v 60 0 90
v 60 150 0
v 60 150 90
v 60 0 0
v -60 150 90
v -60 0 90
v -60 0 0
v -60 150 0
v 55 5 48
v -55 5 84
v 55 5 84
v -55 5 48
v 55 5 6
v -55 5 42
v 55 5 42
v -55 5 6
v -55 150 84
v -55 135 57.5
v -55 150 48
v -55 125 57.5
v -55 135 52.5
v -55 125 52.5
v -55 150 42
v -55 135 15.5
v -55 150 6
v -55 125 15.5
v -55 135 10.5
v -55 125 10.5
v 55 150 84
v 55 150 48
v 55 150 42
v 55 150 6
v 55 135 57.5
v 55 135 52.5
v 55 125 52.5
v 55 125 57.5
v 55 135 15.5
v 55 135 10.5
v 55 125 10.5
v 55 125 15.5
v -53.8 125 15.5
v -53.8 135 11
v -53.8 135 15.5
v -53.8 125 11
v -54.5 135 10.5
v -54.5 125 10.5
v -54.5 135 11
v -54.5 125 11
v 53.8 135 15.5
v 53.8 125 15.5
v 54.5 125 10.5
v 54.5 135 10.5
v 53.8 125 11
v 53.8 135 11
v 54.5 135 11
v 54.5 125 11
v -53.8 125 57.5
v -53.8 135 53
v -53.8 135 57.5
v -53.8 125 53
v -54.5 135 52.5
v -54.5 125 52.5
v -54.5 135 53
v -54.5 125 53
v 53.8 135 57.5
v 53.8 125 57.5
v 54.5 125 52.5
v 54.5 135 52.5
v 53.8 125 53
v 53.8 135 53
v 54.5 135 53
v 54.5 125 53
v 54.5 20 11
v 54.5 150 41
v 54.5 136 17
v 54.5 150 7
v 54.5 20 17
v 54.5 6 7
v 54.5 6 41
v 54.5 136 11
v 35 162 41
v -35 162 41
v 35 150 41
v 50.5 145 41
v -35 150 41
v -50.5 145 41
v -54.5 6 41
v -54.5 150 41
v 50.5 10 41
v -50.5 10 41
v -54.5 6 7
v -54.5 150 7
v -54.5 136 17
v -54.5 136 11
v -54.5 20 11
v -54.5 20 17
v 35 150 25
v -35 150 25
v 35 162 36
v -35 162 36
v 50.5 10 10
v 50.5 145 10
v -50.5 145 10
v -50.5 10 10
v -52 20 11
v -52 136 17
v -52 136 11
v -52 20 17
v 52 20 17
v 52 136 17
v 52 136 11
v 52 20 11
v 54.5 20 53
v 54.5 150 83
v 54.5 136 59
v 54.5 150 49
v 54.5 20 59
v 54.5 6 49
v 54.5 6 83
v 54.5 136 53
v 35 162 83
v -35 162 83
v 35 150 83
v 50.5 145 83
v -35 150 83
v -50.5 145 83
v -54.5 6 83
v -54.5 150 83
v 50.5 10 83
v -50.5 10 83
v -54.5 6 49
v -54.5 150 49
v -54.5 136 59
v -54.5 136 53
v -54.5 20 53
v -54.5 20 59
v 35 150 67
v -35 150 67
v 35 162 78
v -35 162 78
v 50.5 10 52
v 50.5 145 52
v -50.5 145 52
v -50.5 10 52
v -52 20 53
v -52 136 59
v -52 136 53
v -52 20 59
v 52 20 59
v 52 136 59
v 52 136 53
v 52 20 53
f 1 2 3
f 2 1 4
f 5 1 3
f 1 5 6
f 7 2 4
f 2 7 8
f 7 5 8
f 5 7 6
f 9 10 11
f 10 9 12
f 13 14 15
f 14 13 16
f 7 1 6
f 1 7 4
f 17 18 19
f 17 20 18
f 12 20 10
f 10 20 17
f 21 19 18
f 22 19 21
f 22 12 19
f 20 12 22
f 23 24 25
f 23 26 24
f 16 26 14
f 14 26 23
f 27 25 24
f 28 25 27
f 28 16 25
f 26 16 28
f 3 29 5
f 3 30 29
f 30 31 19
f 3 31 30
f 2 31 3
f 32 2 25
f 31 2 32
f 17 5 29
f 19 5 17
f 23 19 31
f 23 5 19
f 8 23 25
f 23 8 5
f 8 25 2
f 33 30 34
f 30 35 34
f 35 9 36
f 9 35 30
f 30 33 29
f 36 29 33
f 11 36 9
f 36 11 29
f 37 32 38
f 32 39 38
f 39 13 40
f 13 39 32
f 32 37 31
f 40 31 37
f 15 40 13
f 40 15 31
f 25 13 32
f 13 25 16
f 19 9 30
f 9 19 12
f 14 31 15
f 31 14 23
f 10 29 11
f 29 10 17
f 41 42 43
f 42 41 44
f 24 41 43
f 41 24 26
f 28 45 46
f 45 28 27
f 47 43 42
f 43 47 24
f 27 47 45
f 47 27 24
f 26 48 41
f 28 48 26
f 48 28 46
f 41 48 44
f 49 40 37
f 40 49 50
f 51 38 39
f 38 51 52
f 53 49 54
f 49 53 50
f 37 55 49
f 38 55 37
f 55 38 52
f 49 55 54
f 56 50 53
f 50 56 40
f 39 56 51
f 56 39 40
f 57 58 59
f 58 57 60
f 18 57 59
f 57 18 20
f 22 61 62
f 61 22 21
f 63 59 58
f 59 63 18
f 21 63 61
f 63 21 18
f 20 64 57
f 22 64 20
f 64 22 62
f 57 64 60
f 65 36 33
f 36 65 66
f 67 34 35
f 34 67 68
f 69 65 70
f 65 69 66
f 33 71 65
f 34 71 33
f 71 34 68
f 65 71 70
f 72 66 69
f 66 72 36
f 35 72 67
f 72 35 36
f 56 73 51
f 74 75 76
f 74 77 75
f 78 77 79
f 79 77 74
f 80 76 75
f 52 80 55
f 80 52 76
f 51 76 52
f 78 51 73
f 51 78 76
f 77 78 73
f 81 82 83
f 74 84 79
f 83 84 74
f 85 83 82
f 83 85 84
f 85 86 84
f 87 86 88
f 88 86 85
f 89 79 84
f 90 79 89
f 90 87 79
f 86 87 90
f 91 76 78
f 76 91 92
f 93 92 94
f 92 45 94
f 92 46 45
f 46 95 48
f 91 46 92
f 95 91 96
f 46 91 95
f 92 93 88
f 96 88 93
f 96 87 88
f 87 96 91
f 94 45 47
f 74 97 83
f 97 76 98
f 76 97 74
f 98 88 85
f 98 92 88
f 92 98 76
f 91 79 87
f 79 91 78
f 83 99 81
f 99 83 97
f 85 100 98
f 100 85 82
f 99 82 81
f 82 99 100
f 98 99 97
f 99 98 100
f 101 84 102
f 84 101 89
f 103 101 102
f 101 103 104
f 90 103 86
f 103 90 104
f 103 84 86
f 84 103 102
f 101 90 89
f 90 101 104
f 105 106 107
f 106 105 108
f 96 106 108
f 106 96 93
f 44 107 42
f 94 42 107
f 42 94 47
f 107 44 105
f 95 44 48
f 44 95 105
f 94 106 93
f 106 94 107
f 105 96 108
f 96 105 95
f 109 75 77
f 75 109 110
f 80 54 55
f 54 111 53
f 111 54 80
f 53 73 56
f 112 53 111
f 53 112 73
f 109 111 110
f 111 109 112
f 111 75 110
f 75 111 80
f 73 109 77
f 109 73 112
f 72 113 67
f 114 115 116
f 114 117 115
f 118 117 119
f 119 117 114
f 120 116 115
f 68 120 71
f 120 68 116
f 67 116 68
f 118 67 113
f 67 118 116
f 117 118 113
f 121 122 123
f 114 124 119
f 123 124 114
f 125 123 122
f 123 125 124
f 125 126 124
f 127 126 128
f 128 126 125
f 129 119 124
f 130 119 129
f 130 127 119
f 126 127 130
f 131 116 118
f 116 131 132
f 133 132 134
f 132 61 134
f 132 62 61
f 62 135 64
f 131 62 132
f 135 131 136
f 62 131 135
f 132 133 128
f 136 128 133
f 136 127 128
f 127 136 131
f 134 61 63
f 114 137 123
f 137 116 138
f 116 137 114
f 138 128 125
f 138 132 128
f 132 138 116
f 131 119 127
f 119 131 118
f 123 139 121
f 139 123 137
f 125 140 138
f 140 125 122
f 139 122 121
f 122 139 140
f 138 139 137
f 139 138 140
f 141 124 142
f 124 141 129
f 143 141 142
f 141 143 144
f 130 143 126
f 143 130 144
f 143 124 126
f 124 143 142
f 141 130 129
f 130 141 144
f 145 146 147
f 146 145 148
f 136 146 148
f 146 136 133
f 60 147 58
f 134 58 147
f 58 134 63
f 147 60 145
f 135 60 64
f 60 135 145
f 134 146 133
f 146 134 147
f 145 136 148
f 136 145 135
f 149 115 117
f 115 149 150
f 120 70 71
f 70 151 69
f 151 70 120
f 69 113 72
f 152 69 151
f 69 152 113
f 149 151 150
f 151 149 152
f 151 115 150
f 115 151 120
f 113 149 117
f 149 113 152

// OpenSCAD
part = "assembly"; // [assembly:Assembly, frame:Frame, drawer:Drawer]
cadverify_only = "";
module instance(name, part, unit = 1) {
    echo(cadverify_instance = [name, part, unit]);
    if (cadverify_only == "" || cadverify_only == name) children();
}
// frame assembly coords: X -60..60, Y 0..150, Z 0..90
module frame_asm() {
    union() {
        translate([-60,0,0]) cube([120,5,90]);
        translate([-60,0,0]) cube([5,150,90]);
        translate([55,0,0]) cube([5,150,90]);
        translate([-55,5,0]) cube([110,145,6]);
        translate([-55,5,42]) cube([110,145,6]);
        translate([-55,5,84]) cube([110,145,6]);
        translate([-55,125,10.5]) cube([1.2,10,5]);
        translate([53.8,125,10.5]) cube([1.2,10,5]);
        translate([-55,125,52.5]) cube([1.2,10,5]);
        translate([53.8,125,52.5]) cube([1.2,10,5]);
    }
}
module frame_print() {
    translate([0,90,0]) rotate([90,0,0]) frame_asm();
}
// drawer part coords: X -54.5..54.5, Y 0..144 body + handle to 156, Z 0..34
module drawer_raw() {
    difference() {
        union() {
            translate([-54.5,0,0]) cube([109,144,34]);
            // handle wedge (solid triangular prism via hull) + tip block, overlapped for manifold union
            hull() {
                translate([-35,143,18]) cube([70,1,1]);
                translate([-35,143,29]) cube([70,1,1]);
                translate([-35,155,29]) cube([70,1,1]);
            }
            translate([-35,143,29]) cube([70,13,5]);
        }
        translate([-50.5,4,3]) cube([101,135,32]);
        translate([-54.5,14,4]) cube([2.5,116,6]);
        translate([52,14,4]) cube([2.5,116,6]);
    }
}
module drawer_part() { drawer_raw(); }
module frame_spec() {
    echo(cadverify_spec = [
        ["bounds", [[-60,0,0],[60,90,150]]],
        ["bodies", 1],
        ["through_holes", 0],
        ["support_faces", [["bed","-z",5000]]],
        ["overhangs_allowed", [
            ["stop tab underside, bridge 2.4mm", [[-55,74.5,124],[-53.8,79.5,126]]],
            ["stop tab underside, bridge 2.4mm", [[53.8,74.5,124],[55,79.5,126]]],
            ["stop tab underside, bridge 2.4mm", [[-55,32.5,124],[-53.8,37.5,126]]],
            ["stop tab underside, bridge 2.4mm", [[53.8,32.5,124],[55,37.5,126]]]
        ]],
        ["copies", 1],
        ["details", [
            ["back_panel","material",[[-60,0,0],[60,90,5]],0.9],
            ["stop_tab_ll","material",[[-55,74.5,125],[-53.8,79.5,135]],0.9],
            ["stop_tab_lr","material",[[53.8,74.5,125],[55,79.5,135]],0.9],
            ["stop_tab_ul","material",[[-55,32.5,125],[-53.8,37.5,135]],0.9],
            ["stop_tab_ur","material",[[53.8,32.5,125],[55,37.5,135]],0.9],
            ["lower_cavity","void",[[-55,48,5],[55,84,150]],0.9],
            ["upper_cavity","void",[[-55,6,5],[55,42,150]],0.9],
            ["back","thickness",[0,10,-1],[0,0,1],5]
        ]]
    ]);
}
module drawer_spec() {
    echo(cadverify_spec = [
        ["bounds", [[-54.5,0,0],[54.5,156,34]]],
        ["bodies", 1],
        ["through_holes", 0],
        ["support_faces", [["bed","-z",10000]]],
        ["overhangs_allowed", [
            ["drawer slide groove ceiling, bridge 5mm", [[-54.5,14,9],[-52,130,11]]],
            ["drawer slide groove ceiling, bridge 5mm", [[52,14,9],[54.5,130,11]]]
        ]],
        ["copies", 2],
        ["details", [
            ["pull_tip","material",[[-35,150,30],[35,156,34]],0.9],
            ["groove_left","void",[[-54.5,14,4],[-52,130,10]],0.9],
            ["groove_right","void",[[52,14,4],[54.5,130,10]],0.9],
            ["drawer_cavity","void",[[-50.5,4,3],[50.5,139,34]],0.9],
            ["bottom","thickness",[0,70,-1],[0,0,1],3],
            ["side_walls","thickness",[-55.5,70,20],[1,0,0],8],
            ["pull_shape","view",[[-35,144,18],[35,156,34]]]
        ]]
    ]);
}
module assembly_spec() {
    echo(cadverify_spec = [
        ["bounds", [[-60,0,0],[60,162,90]]],
        ["support_faces", [["base","-z",5000]]],
        ["allowed_interferences", []],
        ["motions", [
            ["drawer_lower_slide", ["drawer_lower"], "slide", [0,1,0], [0,105], ["stops", [0,105]]],
            ["drawer_upper_slide", ["drawer_upper"], "slide", [0,1,0], [0,105], ["stops", [0,105]]]
        ]],
        ["assembly_order", [
            [["frame"], [0,0,0]],
            [["drawer_lower"], [0,-1,0], ["flex", [["drawer_lower","frame",0.7,"stop tabs snap into grooves"]]]],
            [["drawer_upper"], [0,-1,0], ["flex", [["drawer_upper","frame",0.7,"stop tabs snap into grooves"]]]]
        ]]
    ]);
}
if (part == "frame") { frame_spec(); frame_print(); }
else if (part == "drawer") { drawer_spec(); drawer_part(); }
else if (part == "assembly") {
    assembly_spec();
    instance("frame","frame",1) frame_asm();
    instance("drawer_lower","drawer",1) translate([0,6,7]) drawer_raw();
    instance("drawer_upper","drawer",1) translate([0,6,49]) drawer_raw();
}
